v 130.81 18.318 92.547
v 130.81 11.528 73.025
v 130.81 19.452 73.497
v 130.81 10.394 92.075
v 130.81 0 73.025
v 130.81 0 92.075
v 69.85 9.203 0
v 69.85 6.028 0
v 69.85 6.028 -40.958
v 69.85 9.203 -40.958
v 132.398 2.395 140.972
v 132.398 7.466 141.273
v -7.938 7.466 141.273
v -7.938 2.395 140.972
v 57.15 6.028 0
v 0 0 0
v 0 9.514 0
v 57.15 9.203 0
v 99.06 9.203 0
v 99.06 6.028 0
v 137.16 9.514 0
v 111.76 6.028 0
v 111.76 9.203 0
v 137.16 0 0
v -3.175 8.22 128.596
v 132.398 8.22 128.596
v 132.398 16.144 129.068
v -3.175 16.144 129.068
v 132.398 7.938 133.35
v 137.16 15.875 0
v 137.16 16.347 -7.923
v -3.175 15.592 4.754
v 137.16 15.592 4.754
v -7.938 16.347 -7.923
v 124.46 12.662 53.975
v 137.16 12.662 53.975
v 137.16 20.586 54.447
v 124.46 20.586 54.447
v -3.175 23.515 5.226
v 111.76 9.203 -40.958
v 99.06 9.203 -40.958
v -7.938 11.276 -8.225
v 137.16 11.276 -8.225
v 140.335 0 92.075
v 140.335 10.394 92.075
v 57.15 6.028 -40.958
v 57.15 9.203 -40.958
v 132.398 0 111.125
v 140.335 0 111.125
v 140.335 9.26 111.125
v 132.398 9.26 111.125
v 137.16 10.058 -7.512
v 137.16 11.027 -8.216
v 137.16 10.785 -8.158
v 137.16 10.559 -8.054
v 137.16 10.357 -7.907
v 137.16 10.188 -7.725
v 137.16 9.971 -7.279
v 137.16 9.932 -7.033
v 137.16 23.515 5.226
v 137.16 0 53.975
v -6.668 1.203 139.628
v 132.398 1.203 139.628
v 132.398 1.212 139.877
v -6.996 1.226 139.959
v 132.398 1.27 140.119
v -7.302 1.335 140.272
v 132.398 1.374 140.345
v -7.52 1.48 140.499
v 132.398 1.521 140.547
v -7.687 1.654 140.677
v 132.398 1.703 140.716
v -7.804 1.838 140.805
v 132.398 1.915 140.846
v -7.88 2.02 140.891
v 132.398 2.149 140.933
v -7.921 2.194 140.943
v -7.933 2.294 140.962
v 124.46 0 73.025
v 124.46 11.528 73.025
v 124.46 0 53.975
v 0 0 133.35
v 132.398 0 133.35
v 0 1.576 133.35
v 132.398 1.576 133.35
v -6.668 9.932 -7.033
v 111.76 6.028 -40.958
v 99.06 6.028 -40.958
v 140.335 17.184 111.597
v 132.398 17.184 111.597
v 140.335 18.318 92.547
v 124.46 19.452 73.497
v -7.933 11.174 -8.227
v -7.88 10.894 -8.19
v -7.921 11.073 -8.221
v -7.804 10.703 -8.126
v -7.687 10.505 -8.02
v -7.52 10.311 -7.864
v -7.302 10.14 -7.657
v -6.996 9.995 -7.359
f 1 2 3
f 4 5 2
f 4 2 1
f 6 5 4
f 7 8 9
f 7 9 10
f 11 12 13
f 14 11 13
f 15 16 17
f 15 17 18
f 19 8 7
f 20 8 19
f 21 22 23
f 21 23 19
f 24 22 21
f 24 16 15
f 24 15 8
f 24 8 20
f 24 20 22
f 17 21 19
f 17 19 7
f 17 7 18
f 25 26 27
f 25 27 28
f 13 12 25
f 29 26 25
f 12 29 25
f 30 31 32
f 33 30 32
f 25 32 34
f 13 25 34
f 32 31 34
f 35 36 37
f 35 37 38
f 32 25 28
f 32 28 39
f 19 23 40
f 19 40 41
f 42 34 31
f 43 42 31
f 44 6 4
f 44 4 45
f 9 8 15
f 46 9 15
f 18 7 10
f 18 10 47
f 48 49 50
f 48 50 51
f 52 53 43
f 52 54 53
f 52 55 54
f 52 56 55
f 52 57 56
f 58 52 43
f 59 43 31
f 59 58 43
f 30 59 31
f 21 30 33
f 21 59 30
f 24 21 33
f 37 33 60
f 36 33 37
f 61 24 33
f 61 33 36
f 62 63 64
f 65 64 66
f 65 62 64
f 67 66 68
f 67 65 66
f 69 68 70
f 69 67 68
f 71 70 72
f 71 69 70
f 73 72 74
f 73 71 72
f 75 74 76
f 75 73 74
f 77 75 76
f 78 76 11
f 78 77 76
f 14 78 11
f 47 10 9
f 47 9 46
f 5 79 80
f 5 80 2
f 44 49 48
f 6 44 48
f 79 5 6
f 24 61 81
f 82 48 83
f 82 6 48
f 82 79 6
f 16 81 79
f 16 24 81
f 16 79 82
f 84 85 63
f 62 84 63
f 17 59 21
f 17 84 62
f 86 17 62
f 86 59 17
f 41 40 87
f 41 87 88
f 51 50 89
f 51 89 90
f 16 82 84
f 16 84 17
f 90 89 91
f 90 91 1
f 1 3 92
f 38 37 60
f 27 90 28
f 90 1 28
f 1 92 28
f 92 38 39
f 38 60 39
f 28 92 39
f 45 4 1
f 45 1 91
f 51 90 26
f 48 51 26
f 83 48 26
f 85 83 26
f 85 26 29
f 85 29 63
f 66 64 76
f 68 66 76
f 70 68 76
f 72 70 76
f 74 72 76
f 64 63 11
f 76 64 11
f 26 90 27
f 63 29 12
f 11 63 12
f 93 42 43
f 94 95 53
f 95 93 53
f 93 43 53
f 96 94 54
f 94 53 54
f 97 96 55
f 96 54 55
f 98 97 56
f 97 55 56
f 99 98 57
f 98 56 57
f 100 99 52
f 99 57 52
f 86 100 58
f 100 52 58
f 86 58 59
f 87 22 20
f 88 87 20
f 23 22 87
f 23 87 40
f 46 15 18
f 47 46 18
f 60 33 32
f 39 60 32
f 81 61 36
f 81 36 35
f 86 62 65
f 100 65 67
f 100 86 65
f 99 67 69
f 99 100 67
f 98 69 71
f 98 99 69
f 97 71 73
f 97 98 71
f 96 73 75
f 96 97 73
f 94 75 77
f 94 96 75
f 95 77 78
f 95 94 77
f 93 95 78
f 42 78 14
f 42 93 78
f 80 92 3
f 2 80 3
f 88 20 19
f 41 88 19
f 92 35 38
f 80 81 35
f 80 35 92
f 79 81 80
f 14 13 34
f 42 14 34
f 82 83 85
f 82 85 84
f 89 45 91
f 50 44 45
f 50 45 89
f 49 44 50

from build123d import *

# Parameters (mm, degrees)
BOSS_EXTRUDE1_DEPTH = 15.875
CUT_EXTRUDE1_DEPTH  = 195.237355702
BOSS_EXTRUDE2_DEPTH = 6.35
FILLET1_R           = 1.27
BOSS_EXTRUDE3_DEPTH = 7.9375
SKETCH5_W           = 12.7
SKETCH5_H           = 3.175
BOSS_EXTRUDE4_DEPTH = 40.9575


with BuildPart() as part:
    # Sketch1 → Boss-Extrude1 (new body)
    with BuildSketch(Plane(origin=(0, 0, 0), x_dir=(1, 0, 0), z_dir=(0, 1, 0))):
        Polygon((0, 0), (137.16, 0), (137.16, -53.975), (124.46, -53.975), (124.46, -73.025), (130.81, -73.025), (130.81, -92.075), (140.335, -92.075), (140.335, -111.125), (132.3975, -111.125), (132.3975, -133.35), (0, -133.35), align=None)
    extrude(amount=BOSS_EXTRUDE1_DEPTH)

    # Sketch2 → Cut-Extrude1 (cut, through all)
    with BuildSketch(Plane.ZY):
        Polygon((133.35, 7.9375), (133.35, 15.875), (0, 15.875), align=None)
    extrude(amount=-CUT_EXTRUDE1_DEPTH, mode=Mode.SUBTRACT)

    # Sketch3 → Boss-Extrude2 (add)
    with BuildSketch(Plane(origin=(0, 15.818952125, 0.941604293), x_dir=(1, 0, 0), z_dir=(0, 0.9982331517348171, 0.05941863998421531))):
        Polygon((-7.9375, 8.88077091), (137.16, 8.88077091), (137.16, -6.99422909), (7.9375, -6.99422909), (7.9375, -124.705255329), (132.3975, -124.705255329), (132.3975, -140.580255329), (-7.9375, -140.580255329), align=None)
    extrude(amount=-BOSS_EXTRUDE2_DEPTH)

    # Fillet1
    fillet1_edges = [part.edges().sort_by_distance(p)[0] for p in [
        (-7.9375, 5.567469486, 66.297691636),
        (64.61125, 10.007854941, -8.300784006),
        (62.23, 1.127084032, 140.896167278),
    ]]
    fillet(fillet1_edges, radius=FILLET1_R)

    # Sketch4 → Boss-Extrude3 (add)
    with BuildSketch(Plane(origin=(0, 15.818952125, 0.941604293), x_dir=(1, 0, 0), z_dir=(0, 0.9982331517348171, 0.05941863998421531))):
        Polygon((-3.175, -3.81922909), (103.849852773, -3.81922909), (137.16, -3.81922909), (137.16, -53.12726352), (124.46, -53.12726352), (124.46, -72.210981554), (130.81, -72.210981554), (130.81, -91.294699588), (140.335, -91.294699588), (140.335, -110.378417623), (132.3975, -110.378417623), (132.3975, -127.880255329), (-3.175, -127.880255329), align=None)
    extrude(amount=BOSS_EXTRUDE3_DEPTH)

    # Sketch5 → Boss-Extrude4 (add)
    with BuildSketch(Plane(origin=(0, 0, 0), x_dir=(-1, 0, 0), z_dir=(0, 0, -1))):
        with Locations((-63.5, 7.615385455)):
            Rectangle(SKETCH5_W, SKETCH5_H)
        with Locations((-105.41, 7.615385455)):
            Rectangle(SKETCH5_W, SKETCH5_H)
    extrude(amount=BOSS_EXTRUDE4_DEPTH)


solid = part.part
